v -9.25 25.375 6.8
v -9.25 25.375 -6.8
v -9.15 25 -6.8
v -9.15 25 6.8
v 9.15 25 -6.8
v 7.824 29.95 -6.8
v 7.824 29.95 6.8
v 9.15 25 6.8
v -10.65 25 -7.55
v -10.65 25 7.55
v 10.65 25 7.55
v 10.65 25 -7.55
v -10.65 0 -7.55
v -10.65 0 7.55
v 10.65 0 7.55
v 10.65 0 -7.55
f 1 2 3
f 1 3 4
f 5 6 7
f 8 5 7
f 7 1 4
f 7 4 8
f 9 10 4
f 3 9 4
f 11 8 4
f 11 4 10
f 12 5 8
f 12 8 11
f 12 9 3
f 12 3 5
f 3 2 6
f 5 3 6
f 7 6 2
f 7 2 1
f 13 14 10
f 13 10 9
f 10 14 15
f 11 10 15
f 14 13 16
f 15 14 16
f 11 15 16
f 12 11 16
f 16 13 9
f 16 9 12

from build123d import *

# Parameters (mm, degrees)
SKETCH1_W           = 21.3
SKETCH1_H           = 15.1
BOSS_EXTRUDE1_DEPTH = 25
BOSS_EXTRUDE2_REACH = 34.289
SKETCH4_W           = 13.6
SKETCH4_H           = 17.676442621


with BuildPart() as part:
    # Sketch1 → Boss-Extrude1 (new body)
    with BuildSketch(Plane(origin=(0, 0, 0), x_dir=(1, 0, 0), z_dir=(0, 1, 0))):
        Rectangle(SKETCH1_W, SKETCH1_H)
    extrude(amount=BOSS_EXTRUDE1_DEPTH)

    # Boss-Extrude2: up to this plane
    boss_extrude2_end = Plane(origin=(0, 25, 0), z_dir=(0, 1, 0))
    # Sketch4 → Boss-Extrude2 (add, up to the surface)
    with BuildSketch(Plane(origin=(-6.963414725, 25.987817547, 0), x_dir=(0, 0, 1), z_dir=(-0.25881904510252474, 0.9659258262890673, 0)), mode=Mode.PRIVATE) as boss_extrude2_sk1:
        with Locations((0, 6.470476128)):
            Rectangle(SKETCH4_W, SKETCH4_H)
    boss_extrude2_tool1 = split(extrude(boss_extrude2_sk1.sketch, amount=-BOSS_EXTRUDE2_REACH, mode=Mode.PRIVATE), bisect_by=boss_extrude2_end, keep=Keep.BOTH, mode=Mode.PRIVATE)
    add(boss_extrude2_tool1.solids().sort_by_distance((-0.713415, 27.6625, 0))[0])


solid = part.part
